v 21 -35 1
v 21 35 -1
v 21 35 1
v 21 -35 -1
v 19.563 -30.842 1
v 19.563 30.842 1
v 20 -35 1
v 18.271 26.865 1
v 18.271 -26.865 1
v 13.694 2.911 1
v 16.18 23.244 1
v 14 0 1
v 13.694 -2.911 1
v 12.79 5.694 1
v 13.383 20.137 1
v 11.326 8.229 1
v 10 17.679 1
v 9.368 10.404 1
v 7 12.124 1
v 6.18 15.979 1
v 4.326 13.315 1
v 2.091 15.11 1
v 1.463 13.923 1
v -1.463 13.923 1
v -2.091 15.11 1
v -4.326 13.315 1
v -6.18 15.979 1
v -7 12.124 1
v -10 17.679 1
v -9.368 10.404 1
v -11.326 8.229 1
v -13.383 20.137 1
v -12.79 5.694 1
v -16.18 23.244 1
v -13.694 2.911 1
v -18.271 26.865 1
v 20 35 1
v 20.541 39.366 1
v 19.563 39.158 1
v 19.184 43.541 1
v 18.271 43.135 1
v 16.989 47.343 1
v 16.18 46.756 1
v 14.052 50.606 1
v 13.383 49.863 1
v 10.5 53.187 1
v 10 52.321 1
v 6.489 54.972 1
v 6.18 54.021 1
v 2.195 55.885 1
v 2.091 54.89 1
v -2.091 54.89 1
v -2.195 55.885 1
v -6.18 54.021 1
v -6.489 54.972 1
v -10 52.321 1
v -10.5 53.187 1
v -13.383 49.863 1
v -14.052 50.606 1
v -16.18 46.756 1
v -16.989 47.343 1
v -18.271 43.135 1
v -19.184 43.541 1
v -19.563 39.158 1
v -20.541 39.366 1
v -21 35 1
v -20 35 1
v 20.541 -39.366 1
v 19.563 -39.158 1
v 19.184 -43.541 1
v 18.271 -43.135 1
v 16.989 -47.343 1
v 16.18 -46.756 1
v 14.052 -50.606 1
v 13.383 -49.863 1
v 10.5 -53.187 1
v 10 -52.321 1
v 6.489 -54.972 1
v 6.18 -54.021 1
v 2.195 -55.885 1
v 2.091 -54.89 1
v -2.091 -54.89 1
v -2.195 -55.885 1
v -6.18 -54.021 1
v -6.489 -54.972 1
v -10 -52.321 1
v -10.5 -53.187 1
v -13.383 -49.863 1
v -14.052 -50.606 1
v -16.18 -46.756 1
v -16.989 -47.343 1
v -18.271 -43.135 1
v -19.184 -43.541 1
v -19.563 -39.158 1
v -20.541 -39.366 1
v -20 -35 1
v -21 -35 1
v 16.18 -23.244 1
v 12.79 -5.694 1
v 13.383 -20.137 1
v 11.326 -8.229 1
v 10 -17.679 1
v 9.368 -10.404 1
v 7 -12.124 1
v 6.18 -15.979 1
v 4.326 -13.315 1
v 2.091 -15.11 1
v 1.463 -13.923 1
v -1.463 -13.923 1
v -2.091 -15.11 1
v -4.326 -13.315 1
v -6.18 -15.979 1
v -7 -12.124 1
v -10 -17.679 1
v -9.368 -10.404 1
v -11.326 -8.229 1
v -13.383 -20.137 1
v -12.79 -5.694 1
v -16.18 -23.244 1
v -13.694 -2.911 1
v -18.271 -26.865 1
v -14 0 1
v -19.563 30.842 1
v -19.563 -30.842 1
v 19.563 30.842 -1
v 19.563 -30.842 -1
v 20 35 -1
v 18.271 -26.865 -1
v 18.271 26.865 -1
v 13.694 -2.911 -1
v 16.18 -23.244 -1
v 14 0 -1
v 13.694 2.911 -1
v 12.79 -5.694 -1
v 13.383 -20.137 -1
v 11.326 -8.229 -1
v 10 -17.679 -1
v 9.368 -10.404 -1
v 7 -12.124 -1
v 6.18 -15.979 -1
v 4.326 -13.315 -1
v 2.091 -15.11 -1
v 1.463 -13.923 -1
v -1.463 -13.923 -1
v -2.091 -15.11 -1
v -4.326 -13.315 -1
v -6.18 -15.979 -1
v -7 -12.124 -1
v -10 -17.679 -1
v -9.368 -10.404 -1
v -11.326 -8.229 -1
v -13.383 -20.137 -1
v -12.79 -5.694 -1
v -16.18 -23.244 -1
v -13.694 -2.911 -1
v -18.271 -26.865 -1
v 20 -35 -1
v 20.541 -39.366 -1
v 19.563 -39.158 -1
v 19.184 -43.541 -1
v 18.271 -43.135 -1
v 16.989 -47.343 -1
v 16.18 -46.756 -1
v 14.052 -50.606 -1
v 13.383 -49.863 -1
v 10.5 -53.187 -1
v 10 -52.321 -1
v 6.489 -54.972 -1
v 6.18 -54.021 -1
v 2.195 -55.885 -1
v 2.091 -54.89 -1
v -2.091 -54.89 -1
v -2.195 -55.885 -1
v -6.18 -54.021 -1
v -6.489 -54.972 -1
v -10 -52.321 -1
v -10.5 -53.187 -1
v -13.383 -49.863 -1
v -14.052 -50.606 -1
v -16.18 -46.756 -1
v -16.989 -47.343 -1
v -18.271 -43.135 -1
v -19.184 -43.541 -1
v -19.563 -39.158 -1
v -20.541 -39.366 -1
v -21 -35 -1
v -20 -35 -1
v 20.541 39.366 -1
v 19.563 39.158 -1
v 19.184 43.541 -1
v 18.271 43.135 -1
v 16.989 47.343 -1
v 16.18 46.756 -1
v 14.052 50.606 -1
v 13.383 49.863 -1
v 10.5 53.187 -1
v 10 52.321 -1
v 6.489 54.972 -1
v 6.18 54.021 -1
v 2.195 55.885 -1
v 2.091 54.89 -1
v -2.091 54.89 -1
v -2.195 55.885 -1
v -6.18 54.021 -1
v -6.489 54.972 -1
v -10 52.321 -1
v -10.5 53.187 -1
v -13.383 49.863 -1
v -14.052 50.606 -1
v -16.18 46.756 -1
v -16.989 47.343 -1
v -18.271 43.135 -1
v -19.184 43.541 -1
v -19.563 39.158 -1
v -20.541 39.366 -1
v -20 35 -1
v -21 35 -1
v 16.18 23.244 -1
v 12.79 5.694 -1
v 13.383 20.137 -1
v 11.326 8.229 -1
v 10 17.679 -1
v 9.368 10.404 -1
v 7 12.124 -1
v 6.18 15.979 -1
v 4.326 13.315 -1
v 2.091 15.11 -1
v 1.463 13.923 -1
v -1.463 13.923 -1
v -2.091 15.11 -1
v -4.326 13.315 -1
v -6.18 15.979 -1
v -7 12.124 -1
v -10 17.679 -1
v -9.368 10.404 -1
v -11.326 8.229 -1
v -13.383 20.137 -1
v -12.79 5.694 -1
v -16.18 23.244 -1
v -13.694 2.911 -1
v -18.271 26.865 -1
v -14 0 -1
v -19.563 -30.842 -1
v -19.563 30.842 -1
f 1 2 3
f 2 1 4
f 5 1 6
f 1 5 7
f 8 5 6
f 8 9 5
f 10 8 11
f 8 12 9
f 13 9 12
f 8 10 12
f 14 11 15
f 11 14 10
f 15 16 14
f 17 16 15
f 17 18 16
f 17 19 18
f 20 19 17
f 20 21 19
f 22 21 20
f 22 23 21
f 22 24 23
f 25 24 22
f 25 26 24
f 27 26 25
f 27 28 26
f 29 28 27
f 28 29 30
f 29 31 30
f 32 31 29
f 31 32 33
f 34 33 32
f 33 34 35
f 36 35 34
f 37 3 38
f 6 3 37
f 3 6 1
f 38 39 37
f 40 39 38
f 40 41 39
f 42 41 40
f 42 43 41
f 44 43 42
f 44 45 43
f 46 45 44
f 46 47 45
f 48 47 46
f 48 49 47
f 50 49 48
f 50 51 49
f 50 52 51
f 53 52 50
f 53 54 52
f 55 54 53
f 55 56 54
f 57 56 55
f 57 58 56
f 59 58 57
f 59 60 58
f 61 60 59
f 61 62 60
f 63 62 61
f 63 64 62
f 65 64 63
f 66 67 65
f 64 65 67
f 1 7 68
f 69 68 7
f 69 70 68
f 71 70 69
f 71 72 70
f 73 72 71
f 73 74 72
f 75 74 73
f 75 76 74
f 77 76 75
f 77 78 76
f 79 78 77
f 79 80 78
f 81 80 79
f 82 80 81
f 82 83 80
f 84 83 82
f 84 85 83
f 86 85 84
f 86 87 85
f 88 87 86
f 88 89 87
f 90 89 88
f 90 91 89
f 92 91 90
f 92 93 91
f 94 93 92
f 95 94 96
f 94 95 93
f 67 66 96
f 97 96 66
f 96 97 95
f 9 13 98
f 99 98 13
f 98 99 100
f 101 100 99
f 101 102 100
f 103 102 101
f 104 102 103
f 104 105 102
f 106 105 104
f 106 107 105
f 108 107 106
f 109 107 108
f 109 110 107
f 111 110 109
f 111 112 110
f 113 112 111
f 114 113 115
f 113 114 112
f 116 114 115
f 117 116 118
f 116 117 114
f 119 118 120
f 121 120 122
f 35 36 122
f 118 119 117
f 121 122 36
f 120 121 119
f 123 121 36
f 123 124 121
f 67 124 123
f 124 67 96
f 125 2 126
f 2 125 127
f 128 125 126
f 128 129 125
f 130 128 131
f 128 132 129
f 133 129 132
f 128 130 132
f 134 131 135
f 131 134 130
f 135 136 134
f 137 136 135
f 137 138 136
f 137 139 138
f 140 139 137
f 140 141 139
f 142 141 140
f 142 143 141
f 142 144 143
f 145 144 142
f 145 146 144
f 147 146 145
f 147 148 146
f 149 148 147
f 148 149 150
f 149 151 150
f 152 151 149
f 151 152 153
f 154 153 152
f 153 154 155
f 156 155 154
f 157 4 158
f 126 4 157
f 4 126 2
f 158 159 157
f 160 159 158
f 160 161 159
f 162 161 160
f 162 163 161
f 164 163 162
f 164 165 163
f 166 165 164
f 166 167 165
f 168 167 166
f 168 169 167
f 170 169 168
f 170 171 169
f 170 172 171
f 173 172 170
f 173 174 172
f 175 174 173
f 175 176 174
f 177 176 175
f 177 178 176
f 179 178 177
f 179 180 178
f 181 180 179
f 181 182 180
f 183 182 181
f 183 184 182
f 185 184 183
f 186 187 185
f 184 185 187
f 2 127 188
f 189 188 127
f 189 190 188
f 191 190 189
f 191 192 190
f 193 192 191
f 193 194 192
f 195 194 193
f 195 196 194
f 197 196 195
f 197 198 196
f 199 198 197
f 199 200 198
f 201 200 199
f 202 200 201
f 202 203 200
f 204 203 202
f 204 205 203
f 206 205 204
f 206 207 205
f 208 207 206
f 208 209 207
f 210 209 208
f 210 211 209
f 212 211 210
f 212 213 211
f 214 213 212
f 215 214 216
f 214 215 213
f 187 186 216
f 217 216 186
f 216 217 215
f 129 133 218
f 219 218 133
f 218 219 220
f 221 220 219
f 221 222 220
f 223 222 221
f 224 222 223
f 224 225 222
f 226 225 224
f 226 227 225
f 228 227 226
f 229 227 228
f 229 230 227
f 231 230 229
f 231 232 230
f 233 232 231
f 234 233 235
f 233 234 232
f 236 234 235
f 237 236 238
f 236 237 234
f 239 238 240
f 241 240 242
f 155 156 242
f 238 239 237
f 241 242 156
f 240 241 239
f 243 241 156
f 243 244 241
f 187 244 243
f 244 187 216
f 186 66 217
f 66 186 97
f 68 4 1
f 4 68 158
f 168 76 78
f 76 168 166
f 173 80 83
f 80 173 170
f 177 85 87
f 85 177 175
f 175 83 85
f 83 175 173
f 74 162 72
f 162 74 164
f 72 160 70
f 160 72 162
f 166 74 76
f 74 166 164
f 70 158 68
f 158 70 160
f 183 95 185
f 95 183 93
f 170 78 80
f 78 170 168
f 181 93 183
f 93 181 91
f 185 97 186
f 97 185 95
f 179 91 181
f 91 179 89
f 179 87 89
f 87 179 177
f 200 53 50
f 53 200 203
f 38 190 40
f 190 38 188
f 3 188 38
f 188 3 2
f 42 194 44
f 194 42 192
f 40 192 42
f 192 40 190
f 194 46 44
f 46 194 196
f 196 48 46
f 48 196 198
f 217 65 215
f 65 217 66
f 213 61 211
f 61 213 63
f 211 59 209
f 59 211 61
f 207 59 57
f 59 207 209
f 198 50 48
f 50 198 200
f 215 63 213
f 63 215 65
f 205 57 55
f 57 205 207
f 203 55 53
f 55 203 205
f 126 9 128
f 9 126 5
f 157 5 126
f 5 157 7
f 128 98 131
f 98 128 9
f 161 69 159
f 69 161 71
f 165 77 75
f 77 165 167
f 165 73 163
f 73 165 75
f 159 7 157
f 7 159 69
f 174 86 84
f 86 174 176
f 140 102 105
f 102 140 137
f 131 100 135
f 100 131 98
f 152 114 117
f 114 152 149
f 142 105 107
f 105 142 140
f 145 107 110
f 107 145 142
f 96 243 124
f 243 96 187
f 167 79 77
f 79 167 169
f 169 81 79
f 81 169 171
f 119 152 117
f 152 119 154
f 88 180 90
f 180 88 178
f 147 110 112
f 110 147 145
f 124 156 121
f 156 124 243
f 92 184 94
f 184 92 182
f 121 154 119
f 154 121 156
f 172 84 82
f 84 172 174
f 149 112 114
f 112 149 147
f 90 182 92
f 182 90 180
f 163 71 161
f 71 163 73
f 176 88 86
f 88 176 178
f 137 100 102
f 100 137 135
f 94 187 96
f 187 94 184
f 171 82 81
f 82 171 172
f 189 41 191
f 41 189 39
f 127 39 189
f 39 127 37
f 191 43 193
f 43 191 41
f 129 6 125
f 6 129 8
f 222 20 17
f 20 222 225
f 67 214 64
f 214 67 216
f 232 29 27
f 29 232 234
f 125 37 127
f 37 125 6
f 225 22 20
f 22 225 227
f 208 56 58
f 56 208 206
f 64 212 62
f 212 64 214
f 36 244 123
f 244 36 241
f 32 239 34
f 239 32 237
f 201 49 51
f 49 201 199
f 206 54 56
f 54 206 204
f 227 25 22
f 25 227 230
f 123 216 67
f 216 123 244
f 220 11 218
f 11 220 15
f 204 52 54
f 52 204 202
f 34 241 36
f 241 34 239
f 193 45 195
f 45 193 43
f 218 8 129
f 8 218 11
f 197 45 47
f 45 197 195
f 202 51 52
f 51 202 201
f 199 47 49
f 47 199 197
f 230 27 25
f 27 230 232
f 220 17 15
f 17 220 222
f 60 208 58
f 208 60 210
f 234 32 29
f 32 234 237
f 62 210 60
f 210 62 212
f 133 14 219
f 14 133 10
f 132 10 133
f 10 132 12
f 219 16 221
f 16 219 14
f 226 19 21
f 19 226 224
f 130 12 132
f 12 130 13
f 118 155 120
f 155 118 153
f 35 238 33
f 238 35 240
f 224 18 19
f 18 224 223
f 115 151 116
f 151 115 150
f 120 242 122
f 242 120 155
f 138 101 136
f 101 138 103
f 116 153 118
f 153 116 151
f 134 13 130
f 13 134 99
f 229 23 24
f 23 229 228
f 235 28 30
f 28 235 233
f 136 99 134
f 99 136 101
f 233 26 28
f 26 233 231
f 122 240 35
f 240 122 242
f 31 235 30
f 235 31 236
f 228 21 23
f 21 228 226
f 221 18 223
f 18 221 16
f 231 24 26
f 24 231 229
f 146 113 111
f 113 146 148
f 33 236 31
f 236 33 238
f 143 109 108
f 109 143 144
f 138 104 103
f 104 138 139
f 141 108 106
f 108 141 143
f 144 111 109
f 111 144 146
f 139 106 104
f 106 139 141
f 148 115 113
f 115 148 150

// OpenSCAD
/*
Written by Becky Button 11/2/16

This is a customizer script that allows the user to create a fidget toy using coins as counter wieghts. If you do not wish to use coins as counter wieght simply put the diameter of your bearing.
Assumptions:
    -The diameter is not zero
    -Dimensions are in millimeters
*/
/*
Standard coin diamters:
Quarter: 25mm
Dime:
Nickel:
Penny: 20mm

*/
//user variables begin
diameterOfBearing = 28;
diameterOfCoin = 40;
widthOfBearing = 2;
spaceDistance = 1;
//user variables end

halfLengthBase = (diameterOfBearing+spaceDistance*2+diameterOfCoin)*.5;

bearingRadius=.5*diameterOfBearing;
coinRadius=.5*diameterOfCoin;


//big coin
if(diameterOfCoin>diameterOfBearing)
    {
        difference()
        {
    union()
        {
        cube(size=[diameterOfCoin+2, 2*spaceDistance+diameterOfCoin+diameterOfBearing, widthOfBearing], center=true);
            
       translate([0, -halfLengthBase, -widthOfBearing*.5]) color([1,0,0])
        cylinder(h=widthOfBearing, r=coinRadius+1);
                
        translate([0, halfLengthBase, -widthOfBearing*.5]) color([0,1,0]) 
        cylinder(h=widthOfBearing, r=coinRadius+1);
}
translate([0, -halfLengthBase, -widthOfBearing*.5-4])
    cylinder(h=widthOfBearing+8, r=diameterOfCoin*.5);
translate([0, halfLengthBase, -widthOfBearing*.5 -4]) color([0,1,1]) 
cylinder(h=widthOfBearing+8, r=diameterOfCoin*.5);
cylinder(h=widthOfBearing+8, r=diameterOfBearing*.5, center=true);
    }
}
//big bearing
else{
    difference(){
        union(){     
            cube(size=[diameterOfBearing+2, 2*spaceDistance+diameterOfBearing+diameterOfCoin, widthOfBearing], center=true);

            translate([0, -halfLengthBase, -widthOfBearing*.5]) color([1,0,0])
            cylinder(h=widthOfBearing, r=bearingRadius+1);
                    
            translate([0, halfLengthBase, -widthOfBearing*.5]) color([0,1,0]) 
            cylinder(h=widthOfBearing, r=bearingRadius+1);
            }
    translate([0, -halfLengthBase, -widthOfBearing*.5-4])
        cylinder(h=widthOfBearing+8, r=diameterOfCoin*.5);
    translate([0, halfLengthBase, -widthOfBearing*.5 -4]) color([0,1,1]) 
    cylinder(h=widthOfBearing+8, r=diameterOfCoin*.5);
    cylinder(h=widthOfBearing+8, r=diameterOfBearing*.5, center=true);
        }
}
